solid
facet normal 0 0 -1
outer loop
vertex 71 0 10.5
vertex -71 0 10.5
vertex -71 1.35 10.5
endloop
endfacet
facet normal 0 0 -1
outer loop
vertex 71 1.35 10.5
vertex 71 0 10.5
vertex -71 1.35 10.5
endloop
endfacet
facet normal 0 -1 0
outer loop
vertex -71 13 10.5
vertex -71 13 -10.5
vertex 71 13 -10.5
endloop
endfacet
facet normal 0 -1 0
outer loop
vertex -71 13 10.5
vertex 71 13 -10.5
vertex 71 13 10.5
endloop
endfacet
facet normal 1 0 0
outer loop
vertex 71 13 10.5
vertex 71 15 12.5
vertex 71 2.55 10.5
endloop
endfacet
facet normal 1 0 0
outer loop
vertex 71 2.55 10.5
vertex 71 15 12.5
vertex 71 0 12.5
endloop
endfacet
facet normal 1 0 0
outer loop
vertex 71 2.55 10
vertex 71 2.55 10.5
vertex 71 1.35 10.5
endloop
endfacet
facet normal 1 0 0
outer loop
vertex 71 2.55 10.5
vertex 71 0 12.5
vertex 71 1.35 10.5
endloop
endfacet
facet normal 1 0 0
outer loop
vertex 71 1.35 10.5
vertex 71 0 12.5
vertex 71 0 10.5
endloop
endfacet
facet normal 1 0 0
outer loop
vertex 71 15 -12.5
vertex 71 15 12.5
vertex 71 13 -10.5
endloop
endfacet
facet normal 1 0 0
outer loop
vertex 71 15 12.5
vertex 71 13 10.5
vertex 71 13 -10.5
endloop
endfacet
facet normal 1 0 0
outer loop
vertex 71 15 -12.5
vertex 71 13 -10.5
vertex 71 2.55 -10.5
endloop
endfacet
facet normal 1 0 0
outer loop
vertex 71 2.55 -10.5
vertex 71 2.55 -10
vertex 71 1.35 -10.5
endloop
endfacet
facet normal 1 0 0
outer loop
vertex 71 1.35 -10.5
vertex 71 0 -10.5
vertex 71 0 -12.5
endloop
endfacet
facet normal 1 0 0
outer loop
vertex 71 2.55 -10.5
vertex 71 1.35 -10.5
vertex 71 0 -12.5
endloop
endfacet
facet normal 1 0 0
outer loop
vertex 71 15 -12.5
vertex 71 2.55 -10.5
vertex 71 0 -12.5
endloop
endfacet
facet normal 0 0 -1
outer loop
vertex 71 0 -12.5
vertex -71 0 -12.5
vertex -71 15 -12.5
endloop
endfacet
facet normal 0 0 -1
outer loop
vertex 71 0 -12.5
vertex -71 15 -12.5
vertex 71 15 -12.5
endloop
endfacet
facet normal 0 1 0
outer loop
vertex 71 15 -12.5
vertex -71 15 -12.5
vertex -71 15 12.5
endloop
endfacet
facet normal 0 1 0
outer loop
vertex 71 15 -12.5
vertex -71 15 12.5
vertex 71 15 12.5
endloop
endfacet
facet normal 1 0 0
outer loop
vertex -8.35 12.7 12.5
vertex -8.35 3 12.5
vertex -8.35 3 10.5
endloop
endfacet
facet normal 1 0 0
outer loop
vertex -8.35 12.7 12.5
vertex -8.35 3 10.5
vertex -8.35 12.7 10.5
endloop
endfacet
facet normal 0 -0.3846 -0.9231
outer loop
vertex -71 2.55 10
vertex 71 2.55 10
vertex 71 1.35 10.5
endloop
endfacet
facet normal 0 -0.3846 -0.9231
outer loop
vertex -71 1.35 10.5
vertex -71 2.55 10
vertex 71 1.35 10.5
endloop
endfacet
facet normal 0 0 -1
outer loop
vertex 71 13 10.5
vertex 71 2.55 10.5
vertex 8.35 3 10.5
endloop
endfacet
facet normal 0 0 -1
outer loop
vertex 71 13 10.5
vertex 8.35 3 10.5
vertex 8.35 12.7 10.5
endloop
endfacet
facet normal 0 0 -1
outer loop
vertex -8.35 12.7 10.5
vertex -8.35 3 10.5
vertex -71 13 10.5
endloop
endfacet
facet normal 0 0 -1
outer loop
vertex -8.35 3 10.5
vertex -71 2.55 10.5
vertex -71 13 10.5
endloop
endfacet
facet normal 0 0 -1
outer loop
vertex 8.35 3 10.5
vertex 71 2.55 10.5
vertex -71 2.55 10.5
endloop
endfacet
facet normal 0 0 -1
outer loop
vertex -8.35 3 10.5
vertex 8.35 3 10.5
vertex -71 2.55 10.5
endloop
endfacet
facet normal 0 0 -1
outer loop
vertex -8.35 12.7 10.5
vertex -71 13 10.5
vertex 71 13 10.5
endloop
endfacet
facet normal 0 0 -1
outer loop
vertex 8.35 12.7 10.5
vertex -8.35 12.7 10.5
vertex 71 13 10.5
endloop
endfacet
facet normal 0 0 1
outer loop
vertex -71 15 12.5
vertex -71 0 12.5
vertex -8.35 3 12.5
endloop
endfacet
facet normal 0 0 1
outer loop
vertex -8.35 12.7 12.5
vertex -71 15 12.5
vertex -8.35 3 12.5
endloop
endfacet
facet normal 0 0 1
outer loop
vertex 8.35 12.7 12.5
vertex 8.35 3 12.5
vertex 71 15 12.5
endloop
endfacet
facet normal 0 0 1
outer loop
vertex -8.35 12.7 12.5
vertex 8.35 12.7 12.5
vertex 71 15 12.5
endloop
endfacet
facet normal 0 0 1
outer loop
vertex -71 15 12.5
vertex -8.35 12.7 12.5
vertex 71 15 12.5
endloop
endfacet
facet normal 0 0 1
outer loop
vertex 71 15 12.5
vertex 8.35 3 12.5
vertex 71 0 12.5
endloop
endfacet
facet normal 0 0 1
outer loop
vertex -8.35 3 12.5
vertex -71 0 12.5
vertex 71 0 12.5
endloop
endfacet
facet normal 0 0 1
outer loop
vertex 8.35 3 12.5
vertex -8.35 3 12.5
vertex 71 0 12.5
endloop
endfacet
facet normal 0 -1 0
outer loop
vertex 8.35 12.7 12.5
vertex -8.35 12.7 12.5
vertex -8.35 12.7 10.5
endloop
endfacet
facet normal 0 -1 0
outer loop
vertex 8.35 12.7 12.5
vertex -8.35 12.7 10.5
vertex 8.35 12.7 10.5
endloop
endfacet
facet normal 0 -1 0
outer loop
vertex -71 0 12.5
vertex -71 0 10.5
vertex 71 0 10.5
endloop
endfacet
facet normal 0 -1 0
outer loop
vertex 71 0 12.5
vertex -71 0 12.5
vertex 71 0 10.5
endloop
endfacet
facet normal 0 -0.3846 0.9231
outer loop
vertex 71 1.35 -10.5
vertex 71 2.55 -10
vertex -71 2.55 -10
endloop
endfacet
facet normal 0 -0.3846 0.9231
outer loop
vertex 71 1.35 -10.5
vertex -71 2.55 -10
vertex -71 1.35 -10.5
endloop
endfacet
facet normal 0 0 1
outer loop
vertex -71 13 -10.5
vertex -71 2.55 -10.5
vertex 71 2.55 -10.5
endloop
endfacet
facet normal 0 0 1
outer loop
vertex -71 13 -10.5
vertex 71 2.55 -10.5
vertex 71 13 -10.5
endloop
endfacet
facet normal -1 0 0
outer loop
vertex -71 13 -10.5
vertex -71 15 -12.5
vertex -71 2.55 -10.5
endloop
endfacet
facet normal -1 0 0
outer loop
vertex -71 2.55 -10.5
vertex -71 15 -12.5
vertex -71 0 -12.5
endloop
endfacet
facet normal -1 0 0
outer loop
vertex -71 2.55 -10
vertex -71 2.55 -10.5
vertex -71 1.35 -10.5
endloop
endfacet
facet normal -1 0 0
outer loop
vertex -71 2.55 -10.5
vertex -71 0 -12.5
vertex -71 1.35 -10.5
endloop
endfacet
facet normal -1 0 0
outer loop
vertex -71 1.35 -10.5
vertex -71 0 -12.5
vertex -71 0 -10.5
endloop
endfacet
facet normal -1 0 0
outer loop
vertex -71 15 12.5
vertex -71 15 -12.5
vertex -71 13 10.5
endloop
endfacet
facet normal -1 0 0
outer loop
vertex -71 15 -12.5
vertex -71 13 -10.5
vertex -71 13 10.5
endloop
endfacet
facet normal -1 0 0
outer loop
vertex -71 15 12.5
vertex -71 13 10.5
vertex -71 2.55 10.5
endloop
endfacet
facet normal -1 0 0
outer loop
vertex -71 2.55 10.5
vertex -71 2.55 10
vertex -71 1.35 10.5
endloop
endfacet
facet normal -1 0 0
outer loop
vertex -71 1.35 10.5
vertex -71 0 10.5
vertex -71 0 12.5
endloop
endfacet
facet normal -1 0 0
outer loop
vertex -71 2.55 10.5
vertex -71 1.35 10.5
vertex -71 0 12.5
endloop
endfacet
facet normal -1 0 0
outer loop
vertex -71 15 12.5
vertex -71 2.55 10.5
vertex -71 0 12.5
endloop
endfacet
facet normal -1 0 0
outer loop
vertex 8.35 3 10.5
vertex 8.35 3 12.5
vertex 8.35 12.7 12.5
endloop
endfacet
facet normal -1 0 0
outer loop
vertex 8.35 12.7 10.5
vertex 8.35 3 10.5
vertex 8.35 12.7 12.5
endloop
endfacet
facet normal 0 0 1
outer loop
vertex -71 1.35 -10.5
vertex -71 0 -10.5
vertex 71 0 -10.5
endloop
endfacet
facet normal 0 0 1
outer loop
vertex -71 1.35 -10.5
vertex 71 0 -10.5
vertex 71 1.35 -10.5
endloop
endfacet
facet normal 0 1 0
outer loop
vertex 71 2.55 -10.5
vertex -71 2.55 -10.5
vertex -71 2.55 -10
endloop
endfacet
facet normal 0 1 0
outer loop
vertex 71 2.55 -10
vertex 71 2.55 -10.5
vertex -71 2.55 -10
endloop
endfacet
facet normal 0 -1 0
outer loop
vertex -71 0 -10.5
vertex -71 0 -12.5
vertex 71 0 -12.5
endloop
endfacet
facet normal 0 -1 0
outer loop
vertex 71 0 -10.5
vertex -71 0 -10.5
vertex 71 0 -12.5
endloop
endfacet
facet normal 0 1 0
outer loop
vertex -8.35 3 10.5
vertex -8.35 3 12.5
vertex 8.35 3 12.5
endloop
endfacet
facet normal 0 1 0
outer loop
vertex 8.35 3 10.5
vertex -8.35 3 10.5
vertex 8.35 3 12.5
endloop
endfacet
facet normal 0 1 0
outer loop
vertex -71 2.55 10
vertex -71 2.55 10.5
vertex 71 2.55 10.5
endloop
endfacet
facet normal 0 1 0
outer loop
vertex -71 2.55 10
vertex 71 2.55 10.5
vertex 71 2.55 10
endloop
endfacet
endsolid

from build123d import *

# Parameters (mm, degrees)
CROQUIS1_W              = 142
CROQUIS1_H              = 20.7
CROQUIS1_H_2            = 2.15
SALIENTE_EXTRUIR1_DEPTH = 15
CROQUIS2_W              = 21
CROQUIS2_H              = 13
CORTAR_EXTRUIR1_DEPTH   = 230
SALIENTE_EXTRUIR4_DEPTH = 142
CROQUIS12_W             = 16.7
CROQUIS12_H             = 9.7
CORTAR_EXTRUIR2_DEPTH   = 10


with BuildPart() as part:
    # Croquis1 → Saliente-Extruir1 (new body)
    with BuildSketch(Plane(origin=(0, 0, 0), x_dir=(1, 0, 0), z_dir=(0, 1, 0))):
        Rectangle(CROQUIS1_W, CROQUIS1_H)
        with Locations((0, 11.425)):
            Rectangle(CROQUIS1_W, CROQUIS1_H_2)
        with Locations((0, -11.425)):
            Rectangle(CROQUIS1_W, CROQUIS1_H_2)
    extrude(amount=SALIENTE_EXTRUIR1_DEPTH)

    # Croquis2 → Cortar-Extruir1 (cut)
    with BuildSketch(Plane.ZY.offset(71)):
        with Locations((0, 6.5)):
            Rectangle(CROQUIS2_W, CROQUIS2_H)
    extrude(amount=-CORTAR_EXTRUIR1_DEPTH, mode=Mode.SUBTRACT)

    # Croquis11 → Saliente-Extruir4 (add)
    with BuildSketch(Plane.ZY.offset(71)):
        Polygon((-10.5, 1.35), (-10.5, 2.55), (-10, 2.55), align=None)
        Polygon((10, 2.55), (10.5, 1.35), (10.5, 2.55), align=None)
    extrude(amount=-SALIENTE_EXTRUIR4_DEPTH)

    # Croquis12 → Cortar-Extruir2 (cut)
    with BuildSketch(Plane.XY.offset(12.5)):
        with Locations((0, 7.85)):
            Rectangle(CROQUIS12_W, CROQUIS12_H)
    extrude(amount=-CORTAR_EXTRUIR2_DEPTH, mode=Mode.SUBTRACT)


solid = part.part
